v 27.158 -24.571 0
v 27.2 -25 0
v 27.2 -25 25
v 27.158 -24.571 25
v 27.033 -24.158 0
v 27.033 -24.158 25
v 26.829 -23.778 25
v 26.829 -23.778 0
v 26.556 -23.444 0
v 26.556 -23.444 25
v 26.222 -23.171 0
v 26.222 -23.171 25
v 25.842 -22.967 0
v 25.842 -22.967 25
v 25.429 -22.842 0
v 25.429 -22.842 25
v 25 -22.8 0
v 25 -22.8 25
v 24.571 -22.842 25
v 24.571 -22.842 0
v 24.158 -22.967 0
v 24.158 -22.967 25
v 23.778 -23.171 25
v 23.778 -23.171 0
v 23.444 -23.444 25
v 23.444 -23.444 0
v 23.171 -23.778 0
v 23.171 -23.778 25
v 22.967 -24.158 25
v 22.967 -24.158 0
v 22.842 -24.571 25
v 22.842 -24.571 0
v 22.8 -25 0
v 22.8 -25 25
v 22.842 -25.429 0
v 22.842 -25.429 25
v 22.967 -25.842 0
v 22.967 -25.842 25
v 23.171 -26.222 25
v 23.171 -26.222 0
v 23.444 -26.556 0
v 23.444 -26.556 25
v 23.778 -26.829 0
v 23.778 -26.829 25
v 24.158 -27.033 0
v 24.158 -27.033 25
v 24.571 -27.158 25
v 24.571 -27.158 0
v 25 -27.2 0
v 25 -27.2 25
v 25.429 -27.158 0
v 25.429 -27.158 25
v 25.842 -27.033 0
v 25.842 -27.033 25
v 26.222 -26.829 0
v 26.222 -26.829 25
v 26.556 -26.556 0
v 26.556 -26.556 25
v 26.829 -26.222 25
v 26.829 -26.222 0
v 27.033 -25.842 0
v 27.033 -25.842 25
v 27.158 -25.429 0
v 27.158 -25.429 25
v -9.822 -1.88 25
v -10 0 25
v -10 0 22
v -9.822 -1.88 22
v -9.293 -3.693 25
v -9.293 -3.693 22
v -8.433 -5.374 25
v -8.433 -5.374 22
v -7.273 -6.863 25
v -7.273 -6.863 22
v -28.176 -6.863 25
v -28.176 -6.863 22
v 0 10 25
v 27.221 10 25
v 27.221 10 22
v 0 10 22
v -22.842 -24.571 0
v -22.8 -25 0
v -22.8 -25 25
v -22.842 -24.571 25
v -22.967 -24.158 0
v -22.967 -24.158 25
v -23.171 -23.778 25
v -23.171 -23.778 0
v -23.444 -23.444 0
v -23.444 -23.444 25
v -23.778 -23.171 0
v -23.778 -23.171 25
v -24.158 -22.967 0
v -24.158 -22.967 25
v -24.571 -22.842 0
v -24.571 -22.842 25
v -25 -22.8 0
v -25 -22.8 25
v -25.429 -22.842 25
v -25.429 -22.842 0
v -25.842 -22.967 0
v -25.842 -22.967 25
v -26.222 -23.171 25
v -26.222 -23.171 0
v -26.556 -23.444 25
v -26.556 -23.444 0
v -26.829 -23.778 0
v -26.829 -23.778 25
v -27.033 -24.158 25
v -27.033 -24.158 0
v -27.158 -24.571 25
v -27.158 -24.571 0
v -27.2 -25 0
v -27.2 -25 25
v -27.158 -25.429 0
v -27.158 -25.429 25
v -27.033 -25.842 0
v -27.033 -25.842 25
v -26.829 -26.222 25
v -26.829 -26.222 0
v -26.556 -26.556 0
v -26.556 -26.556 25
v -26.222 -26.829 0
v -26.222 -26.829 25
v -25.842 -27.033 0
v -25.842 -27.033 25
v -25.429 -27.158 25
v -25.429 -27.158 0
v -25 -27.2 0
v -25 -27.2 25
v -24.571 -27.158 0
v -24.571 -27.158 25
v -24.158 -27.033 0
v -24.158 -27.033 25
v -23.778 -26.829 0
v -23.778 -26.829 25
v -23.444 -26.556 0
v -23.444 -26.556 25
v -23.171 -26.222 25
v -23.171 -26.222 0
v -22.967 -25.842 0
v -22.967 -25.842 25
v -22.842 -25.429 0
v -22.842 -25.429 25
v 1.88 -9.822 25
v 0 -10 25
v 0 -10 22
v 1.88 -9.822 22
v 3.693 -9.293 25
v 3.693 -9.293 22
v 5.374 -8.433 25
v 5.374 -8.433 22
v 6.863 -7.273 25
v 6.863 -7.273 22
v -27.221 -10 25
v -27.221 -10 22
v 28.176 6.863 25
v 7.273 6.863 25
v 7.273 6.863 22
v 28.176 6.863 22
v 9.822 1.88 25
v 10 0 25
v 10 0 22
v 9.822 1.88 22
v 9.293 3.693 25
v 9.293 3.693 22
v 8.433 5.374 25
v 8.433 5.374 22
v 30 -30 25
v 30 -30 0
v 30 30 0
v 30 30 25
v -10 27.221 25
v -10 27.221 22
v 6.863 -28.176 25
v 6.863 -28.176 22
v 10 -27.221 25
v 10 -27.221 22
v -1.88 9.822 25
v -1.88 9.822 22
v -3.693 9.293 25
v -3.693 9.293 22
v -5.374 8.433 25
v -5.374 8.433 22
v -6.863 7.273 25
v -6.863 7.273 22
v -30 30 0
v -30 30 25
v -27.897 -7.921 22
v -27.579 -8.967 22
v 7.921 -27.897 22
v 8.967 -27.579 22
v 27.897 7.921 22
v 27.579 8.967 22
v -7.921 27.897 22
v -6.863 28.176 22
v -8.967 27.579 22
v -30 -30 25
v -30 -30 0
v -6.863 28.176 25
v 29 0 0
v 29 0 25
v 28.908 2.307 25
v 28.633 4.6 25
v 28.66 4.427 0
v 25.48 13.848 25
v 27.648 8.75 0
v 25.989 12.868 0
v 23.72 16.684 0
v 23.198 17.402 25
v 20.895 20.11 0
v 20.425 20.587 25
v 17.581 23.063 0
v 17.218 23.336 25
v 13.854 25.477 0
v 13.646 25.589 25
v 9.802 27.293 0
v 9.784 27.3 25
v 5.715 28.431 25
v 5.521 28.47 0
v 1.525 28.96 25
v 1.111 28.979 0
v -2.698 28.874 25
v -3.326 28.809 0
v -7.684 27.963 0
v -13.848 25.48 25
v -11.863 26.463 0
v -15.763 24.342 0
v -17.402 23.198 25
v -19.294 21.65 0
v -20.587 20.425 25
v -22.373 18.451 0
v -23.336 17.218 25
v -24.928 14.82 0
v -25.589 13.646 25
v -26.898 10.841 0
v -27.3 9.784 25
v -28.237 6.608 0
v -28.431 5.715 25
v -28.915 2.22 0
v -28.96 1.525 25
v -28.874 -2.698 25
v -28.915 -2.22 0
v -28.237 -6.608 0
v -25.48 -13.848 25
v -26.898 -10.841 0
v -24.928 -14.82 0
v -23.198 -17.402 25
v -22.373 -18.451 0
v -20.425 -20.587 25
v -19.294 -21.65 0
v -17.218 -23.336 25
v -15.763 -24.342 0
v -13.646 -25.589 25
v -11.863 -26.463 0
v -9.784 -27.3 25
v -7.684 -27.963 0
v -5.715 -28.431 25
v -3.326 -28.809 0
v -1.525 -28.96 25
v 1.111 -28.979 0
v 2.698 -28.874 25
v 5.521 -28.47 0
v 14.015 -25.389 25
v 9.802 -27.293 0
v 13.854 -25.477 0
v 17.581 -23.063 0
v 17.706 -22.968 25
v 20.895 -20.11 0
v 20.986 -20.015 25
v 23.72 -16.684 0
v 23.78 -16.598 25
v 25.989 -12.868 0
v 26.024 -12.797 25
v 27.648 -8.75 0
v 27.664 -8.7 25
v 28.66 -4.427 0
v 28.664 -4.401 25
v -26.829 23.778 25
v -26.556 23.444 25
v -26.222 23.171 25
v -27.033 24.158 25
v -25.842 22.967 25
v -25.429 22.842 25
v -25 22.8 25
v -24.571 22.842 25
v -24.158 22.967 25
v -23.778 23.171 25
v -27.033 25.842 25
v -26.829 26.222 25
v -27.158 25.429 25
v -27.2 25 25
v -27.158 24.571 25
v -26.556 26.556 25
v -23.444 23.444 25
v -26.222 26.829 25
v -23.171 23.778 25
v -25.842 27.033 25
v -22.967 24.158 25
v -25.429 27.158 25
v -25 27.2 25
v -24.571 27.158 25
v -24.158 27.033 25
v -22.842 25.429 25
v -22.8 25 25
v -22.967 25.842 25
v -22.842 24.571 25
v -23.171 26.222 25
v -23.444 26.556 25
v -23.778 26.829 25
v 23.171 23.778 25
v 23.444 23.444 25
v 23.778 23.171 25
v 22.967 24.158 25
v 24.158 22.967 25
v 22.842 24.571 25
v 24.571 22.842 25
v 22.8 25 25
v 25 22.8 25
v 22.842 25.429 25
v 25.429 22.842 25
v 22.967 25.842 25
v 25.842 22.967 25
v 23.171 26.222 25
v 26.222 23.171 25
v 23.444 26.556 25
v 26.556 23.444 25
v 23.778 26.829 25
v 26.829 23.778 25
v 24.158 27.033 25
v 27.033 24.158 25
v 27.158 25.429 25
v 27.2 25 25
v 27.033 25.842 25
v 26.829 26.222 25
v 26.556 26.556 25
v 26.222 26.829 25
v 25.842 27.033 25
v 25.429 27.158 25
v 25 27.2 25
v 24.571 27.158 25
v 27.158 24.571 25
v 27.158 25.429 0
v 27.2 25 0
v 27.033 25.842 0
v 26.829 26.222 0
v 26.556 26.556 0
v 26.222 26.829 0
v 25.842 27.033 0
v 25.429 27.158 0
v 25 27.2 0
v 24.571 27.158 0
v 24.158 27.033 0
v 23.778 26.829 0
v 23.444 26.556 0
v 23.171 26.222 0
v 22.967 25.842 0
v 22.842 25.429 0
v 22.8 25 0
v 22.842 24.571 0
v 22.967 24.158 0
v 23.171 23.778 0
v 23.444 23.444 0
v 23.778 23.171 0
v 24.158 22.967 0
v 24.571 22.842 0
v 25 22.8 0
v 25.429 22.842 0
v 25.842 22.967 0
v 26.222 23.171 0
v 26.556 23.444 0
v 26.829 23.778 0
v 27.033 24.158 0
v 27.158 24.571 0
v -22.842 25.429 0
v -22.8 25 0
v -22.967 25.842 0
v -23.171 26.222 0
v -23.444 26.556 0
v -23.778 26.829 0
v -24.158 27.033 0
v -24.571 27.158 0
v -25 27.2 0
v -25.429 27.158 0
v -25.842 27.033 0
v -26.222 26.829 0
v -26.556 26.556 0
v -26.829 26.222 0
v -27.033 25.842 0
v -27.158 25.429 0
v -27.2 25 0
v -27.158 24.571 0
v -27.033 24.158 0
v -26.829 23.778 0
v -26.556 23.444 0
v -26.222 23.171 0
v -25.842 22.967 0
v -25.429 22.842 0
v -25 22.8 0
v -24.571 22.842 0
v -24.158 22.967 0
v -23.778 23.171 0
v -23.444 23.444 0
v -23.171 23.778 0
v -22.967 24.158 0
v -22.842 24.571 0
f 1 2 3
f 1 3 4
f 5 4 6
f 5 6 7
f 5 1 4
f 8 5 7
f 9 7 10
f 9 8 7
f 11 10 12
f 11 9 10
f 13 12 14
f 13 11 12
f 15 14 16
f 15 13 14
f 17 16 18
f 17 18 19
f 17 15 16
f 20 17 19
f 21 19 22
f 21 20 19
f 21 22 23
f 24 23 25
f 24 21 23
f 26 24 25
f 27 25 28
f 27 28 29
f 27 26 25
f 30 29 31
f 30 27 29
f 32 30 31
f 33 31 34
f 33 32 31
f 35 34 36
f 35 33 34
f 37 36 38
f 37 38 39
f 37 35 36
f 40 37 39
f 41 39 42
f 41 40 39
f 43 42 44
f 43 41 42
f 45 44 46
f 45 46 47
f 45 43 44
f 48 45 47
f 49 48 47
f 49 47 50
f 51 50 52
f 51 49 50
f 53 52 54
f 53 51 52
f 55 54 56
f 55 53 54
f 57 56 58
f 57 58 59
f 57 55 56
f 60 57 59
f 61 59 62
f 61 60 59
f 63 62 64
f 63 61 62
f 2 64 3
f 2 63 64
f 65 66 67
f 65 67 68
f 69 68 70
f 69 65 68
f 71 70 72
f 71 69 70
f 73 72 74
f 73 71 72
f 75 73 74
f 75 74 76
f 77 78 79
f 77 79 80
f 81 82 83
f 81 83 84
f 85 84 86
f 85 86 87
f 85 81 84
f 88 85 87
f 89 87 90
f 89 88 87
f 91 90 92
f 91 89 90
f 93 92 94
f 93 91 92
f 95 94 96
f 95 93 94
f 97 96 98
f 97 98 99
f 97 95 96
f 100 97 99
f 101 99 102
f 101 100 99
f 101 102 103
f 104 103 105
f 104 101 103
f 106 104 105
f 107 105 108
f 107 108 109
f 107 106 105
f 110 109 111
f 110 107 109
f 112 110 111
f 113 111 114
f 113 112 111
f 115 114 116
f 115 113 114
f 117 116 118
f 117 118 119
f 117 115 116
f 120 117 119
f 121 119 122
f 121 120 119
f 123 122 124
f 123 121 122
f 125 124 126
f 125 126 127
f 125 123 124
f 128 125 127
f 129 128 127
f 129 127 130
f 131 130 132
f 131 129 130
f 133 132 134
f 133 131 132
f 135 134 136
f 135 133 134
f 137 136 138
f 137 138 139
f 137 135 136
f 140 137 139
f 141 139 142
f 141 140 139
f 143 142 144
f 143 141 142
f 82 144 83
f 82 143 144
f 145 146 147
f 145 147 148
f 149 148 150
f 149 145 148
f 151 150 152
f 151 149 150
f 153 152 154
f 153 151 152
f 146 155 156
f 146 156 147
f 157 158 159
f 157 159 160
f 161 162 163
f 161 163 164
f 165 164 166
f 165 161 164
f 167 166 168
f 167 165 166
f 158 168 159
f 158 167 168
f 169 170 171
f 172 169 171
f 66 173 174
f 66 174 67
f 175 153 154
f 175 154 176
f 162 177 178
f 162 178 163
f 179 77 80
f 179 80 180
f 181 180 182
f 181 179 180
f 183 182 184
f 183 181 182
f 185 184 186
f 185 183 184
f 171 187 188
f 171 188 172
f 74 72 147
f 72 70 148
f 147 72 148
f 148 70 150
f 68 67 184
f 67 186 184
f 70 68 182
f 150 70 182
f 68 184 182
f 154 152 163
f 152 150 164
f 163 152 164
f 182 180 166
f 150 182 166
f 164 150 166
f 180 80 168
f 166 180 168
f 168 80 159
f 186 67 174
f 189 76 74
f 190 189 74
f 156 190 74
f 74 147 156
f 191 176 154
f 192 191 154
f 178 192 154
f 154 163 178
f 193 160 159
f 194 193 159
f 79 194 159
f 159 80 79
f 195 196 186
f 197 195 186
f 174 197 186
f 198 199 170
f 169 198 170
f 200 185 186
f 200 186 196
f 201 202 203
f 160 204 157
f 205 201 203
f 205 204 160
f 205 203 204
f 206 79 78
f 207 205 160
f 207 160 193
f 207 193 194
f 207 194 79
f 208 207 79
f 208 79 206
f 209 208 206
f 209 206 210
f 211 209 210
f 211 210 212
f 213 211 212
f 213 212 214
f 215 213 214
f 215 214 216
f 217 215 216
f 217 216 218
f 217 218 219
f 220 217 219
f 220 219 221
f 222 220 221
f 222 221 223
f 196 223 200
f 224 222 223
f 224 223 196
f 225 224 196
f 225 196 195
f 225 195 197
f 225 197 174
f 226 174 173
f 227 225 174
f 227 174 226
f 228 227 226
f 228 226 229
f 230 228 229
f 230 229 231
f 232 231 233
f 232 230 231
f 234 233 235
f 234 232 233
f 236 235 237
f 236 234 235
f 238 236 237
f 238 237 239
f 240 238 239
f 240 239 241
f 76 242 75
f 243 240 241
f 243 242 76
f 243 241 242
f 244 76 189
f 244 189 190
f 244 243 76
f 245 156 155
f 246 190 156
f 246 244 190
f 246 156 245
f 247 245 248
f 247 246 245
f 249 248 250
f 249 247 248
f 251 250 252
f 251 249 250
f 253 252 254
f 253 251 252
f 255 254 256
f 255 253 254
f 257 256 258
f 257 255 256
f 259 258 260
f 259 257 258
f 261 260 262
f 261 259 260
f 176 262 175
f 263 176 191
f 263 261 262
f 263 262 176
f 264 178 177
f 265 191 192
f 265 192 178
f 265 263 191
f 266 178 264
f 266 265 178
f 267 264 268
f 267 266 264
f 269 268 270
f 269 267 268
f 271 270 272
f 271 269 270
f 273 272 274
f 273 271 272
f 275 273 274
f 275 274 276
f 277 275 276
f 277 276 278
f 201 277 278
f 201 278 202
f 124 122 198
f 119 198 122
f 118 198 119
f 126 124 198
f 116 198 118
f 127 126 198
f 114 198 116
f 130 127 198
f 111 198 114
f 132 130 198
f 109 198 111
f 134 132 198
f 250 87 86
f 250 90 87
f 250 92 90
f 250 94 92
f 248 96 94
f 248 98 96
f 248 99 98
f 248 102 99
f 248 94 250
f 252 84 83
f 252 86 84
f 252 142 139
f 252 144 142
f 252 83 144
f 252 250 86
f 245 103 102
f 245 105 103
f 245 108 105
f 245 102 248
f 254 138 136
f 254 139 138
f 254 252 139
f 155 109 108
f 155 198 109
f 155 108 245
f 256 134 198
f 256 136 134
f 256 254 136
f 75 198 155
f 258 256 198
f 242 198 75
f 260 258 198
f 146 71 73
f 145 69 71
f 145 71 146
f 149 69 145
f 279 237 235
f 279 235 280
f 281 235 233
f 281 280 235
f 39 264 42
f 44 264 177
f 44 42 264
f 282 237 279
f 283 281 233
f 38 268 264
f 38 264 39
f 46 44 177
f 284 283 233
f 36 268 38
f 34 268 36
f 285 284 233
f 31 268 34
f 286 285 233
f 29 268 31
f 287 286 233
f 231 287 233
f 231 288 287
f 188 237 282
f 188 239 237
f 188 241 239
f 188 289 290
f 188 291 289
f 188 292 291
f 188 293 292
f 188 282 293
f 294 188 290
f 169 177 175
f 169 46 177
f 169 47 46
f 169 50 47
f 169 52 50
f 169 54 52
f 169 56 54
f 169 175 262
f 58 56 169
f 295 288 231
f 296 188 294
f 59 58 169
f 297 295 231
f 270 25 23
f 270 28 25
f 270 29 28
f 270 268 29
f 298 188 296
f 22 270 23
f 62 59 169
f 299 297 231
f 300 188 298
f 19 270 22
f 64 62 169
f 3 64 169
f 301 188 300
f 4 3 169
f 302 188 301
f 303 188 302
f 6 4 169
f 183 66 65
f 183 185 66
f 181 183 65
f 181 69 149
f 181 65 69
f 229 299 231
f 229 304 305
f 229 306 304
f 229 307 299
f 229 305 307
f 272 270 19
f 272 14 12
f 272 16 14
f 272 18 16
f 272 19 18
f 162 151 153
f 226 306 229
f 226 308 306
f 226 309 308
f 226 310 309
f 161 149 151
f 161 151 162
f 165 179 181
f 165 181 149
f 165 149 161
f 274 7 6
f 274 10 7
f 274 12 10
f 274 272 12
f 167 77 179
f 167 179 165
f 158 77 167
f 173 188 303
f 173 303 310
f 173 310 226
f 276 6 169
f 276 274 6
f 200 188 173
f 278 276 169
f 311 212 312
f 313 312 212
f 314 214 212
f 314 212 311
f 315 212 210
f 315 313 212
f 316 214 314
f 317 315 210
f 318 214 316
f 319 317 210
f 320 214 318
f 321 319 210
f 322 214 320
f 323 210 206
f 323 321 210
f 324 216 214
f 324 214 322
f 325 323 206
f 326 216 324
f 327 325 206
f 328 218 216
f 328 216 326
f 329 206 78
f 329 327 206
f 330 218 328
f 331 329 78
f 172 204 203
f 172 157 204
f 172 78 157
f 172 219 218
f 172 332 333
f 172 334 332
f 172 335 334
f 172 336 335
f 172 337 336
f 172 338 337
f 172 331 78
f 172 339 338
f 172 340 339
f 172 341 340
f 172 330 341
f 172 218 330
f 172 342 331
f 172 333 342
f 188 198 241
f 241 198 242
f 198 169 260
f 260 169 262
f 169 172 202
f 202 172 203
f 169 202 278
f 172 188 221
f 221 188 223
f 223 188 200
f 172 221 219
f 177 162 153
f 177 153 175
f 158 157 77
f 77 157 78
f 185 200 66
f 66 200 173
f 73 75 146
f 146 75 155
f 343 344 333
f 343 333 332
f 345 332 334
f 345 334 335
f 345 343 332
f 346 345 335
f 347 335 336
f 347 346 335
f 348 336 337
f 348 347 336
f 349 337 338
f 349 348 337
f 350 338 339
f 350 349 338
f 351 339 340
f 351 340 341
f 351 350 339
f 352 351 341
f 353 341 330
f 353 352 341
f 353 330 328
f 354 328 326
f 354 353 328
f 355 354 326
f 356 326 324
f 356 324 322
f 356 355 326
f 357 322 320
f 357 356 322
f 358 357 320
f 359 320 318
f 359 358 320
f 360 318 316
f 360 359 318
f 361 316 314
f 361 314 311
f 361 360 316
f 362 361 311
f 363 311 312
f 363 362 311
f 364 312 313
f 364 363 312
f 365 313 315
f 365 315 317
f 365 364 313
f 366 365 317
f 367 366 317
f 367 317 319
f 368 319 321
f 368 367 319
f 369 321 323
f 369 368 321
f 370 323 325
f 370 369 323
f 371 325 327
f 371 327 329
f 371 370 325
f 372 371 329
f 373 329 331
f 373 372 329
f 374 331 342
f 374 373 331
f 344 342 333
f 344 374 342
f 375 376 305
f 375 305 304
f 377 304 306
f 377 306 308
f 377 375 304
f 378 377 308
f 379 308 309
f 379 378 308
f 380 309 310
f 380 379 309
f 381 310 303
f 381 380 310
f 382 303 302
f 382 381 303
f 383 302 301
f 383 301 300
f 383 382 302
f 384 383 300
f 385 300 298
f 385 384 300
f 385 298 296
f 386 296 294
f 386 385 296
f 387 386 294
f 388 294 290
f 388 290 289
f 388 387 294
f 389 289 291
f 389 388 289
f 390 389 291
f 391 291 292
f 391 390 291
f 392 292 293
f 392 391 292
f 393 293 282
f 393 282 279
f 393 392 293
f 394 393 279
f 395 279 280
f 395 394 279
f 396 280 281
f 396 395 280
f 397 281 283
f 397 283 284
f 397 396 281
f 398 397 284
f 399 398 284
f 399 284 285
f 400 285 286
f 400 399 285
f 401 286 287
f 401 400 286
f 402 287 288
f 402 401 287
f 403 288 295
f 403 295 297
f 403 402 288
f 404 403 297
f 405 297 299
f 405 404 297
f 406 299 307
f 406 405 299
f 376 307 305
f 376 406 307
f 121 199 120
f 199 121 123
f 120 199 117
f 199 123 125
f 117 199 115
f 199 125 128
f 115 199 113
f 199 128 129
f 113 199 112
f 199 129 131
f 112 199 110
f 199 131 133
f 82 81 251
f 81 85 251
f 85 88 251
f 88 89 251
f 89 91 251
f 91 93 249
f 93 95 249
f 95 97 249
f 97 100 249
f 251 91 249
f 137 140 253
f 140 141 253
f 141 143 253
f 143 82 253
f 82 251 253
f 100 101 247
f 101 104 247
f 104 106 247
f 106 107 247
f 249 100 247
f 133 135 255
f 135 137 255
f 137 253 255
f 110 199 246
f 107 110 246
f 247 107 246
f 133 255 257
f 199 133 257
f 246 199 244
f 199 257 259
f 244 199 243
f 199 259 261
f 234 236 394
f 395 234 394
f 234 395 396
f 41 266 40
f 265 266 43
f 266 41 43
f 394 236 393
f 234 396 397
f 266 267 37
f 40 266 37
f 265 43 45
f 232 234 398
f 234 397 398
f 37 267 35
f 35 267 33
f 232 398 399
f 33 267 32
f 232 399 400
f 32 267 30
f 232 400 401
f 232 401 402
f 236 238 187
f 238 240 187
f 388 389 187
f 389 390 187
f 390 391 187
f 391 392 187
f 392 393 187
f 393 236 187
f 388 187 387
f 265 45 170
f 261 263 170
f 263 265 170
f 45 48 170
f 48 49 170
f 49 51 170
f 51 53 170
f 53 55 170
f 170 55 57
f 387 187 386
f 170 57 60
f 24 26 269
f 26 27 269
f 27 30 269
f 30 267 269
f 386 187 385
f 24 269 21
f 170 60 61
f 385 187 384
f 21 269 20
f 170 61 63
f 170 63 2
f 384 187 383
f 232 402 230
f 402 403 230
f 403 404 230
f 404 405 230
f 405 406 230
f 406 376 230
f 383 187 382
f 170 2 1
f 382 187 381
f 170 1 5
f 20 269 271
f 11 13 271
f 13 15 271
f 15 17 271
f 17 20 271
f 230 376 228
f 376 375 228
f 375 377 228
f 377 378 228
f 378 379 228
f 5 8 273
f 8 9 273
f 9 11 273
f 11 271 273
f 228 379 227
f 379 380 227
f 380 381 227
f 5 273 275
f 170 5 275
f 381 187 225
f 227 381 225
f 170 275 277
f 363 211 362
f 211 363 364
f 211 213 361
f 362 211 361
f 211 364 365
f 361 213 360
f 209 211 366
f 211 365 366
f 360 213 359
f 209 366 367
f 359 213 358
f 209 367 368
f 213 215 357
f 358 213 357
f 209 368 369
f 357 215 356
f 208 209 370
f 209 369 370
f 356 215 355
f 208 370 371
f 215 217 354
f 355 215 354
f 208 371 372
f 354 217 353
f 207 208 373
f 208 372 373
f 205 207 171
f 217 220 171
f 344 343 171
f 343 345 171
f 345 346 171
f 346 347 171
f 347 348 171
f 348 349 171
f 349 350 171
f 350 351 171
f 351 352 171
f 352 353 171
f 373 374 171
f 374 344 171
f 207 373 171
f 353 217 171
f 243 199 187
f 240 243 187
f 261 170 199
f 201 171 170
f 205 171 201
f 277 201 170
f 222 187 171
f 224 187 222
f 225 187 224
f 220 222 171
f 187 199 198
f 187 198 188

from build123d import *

# Parameters (mm, degrees)
F0_W     = 60
F0_H     = 60
F0_R     = 2.2
F0_R_2   = 29
F1_DEPTH = 25
F3_DEPTH = 3


with BuildPart() as f1:
    # F0 (on Top) → F1 (new body)
    with BuildSketch(Plane.XY):
        Rectangle(F0_W, F0_H)
        with Locations((-25, -25)):
            Circle(F0_R, mode=Mode.SUBTRACT)
        with Locations((25, -25)):
            Circle(F0_R, mode=Mode.SUBTRACT)
        with Locations((-25, 25)):
            Circle(F0_R, mode=Mode.SUBTRACT)
        Circle(F0_R_2, mode=Mode.SUBTRACT)
        with Locations((25, 25)):
            Circle(F0_R, mode=Mode.SUBTRACT)
    extrude(amount=F1_DEPTH)

    # F2 (on face) → F3 (join)
    with BuildSketch(Plane.XY.offset(25)):
        with BuildLine():
            Line((-10, 27.221315), (-10, 0))
            ThreePointArc((-10, 0), (-9.293222, -3.692698), (-7.272797, -6.863412))
            Line((-7.272797, -6.863412), (-28.176117, -6.863412))
            ThreePointArc((-28.176117, -6.863412), (-27.743079, -8.445211), (-27.221315, -10))
            Line((-27.221315, -10), (0, -10))
            ThreePointArc((0, -10), (3.692698, -9.293222), (6.863412, -7.272797))
            Line((6.863412, -7.272797), (6.863412, -28.176117))
            ThreePointArc((6.863412, -28.176117), (8.445211, -27.743079), (10, -27.221315))
            Line((10, -27.221315), (10, 0))
            ThreePointArc((10, 0), (9.293222, 3.692698), (7.272797, 6.863412))
            Line((7.272797, 6.863412), (28.176117, 6.863412))
            ThreePointArc((28.176117, 6.863412), (27.743079, 8.445211), (27.221315, 10))
            Line((27.221315, 10), (0, 10))
            ThreePointArc((0, 10), (-3.692698, 9.293222), (-6.863412, 7.272797))
            Line((-6.863412, 7.272797), (-6.863412, 28.176117))
            ThreePointArc((-6.863412, 28.176117), (-8.445211, 27.743079), (-10, 27.221315))
        make_face()
    extrude(amount=-F3_DEPTH)


solid = f1.part
